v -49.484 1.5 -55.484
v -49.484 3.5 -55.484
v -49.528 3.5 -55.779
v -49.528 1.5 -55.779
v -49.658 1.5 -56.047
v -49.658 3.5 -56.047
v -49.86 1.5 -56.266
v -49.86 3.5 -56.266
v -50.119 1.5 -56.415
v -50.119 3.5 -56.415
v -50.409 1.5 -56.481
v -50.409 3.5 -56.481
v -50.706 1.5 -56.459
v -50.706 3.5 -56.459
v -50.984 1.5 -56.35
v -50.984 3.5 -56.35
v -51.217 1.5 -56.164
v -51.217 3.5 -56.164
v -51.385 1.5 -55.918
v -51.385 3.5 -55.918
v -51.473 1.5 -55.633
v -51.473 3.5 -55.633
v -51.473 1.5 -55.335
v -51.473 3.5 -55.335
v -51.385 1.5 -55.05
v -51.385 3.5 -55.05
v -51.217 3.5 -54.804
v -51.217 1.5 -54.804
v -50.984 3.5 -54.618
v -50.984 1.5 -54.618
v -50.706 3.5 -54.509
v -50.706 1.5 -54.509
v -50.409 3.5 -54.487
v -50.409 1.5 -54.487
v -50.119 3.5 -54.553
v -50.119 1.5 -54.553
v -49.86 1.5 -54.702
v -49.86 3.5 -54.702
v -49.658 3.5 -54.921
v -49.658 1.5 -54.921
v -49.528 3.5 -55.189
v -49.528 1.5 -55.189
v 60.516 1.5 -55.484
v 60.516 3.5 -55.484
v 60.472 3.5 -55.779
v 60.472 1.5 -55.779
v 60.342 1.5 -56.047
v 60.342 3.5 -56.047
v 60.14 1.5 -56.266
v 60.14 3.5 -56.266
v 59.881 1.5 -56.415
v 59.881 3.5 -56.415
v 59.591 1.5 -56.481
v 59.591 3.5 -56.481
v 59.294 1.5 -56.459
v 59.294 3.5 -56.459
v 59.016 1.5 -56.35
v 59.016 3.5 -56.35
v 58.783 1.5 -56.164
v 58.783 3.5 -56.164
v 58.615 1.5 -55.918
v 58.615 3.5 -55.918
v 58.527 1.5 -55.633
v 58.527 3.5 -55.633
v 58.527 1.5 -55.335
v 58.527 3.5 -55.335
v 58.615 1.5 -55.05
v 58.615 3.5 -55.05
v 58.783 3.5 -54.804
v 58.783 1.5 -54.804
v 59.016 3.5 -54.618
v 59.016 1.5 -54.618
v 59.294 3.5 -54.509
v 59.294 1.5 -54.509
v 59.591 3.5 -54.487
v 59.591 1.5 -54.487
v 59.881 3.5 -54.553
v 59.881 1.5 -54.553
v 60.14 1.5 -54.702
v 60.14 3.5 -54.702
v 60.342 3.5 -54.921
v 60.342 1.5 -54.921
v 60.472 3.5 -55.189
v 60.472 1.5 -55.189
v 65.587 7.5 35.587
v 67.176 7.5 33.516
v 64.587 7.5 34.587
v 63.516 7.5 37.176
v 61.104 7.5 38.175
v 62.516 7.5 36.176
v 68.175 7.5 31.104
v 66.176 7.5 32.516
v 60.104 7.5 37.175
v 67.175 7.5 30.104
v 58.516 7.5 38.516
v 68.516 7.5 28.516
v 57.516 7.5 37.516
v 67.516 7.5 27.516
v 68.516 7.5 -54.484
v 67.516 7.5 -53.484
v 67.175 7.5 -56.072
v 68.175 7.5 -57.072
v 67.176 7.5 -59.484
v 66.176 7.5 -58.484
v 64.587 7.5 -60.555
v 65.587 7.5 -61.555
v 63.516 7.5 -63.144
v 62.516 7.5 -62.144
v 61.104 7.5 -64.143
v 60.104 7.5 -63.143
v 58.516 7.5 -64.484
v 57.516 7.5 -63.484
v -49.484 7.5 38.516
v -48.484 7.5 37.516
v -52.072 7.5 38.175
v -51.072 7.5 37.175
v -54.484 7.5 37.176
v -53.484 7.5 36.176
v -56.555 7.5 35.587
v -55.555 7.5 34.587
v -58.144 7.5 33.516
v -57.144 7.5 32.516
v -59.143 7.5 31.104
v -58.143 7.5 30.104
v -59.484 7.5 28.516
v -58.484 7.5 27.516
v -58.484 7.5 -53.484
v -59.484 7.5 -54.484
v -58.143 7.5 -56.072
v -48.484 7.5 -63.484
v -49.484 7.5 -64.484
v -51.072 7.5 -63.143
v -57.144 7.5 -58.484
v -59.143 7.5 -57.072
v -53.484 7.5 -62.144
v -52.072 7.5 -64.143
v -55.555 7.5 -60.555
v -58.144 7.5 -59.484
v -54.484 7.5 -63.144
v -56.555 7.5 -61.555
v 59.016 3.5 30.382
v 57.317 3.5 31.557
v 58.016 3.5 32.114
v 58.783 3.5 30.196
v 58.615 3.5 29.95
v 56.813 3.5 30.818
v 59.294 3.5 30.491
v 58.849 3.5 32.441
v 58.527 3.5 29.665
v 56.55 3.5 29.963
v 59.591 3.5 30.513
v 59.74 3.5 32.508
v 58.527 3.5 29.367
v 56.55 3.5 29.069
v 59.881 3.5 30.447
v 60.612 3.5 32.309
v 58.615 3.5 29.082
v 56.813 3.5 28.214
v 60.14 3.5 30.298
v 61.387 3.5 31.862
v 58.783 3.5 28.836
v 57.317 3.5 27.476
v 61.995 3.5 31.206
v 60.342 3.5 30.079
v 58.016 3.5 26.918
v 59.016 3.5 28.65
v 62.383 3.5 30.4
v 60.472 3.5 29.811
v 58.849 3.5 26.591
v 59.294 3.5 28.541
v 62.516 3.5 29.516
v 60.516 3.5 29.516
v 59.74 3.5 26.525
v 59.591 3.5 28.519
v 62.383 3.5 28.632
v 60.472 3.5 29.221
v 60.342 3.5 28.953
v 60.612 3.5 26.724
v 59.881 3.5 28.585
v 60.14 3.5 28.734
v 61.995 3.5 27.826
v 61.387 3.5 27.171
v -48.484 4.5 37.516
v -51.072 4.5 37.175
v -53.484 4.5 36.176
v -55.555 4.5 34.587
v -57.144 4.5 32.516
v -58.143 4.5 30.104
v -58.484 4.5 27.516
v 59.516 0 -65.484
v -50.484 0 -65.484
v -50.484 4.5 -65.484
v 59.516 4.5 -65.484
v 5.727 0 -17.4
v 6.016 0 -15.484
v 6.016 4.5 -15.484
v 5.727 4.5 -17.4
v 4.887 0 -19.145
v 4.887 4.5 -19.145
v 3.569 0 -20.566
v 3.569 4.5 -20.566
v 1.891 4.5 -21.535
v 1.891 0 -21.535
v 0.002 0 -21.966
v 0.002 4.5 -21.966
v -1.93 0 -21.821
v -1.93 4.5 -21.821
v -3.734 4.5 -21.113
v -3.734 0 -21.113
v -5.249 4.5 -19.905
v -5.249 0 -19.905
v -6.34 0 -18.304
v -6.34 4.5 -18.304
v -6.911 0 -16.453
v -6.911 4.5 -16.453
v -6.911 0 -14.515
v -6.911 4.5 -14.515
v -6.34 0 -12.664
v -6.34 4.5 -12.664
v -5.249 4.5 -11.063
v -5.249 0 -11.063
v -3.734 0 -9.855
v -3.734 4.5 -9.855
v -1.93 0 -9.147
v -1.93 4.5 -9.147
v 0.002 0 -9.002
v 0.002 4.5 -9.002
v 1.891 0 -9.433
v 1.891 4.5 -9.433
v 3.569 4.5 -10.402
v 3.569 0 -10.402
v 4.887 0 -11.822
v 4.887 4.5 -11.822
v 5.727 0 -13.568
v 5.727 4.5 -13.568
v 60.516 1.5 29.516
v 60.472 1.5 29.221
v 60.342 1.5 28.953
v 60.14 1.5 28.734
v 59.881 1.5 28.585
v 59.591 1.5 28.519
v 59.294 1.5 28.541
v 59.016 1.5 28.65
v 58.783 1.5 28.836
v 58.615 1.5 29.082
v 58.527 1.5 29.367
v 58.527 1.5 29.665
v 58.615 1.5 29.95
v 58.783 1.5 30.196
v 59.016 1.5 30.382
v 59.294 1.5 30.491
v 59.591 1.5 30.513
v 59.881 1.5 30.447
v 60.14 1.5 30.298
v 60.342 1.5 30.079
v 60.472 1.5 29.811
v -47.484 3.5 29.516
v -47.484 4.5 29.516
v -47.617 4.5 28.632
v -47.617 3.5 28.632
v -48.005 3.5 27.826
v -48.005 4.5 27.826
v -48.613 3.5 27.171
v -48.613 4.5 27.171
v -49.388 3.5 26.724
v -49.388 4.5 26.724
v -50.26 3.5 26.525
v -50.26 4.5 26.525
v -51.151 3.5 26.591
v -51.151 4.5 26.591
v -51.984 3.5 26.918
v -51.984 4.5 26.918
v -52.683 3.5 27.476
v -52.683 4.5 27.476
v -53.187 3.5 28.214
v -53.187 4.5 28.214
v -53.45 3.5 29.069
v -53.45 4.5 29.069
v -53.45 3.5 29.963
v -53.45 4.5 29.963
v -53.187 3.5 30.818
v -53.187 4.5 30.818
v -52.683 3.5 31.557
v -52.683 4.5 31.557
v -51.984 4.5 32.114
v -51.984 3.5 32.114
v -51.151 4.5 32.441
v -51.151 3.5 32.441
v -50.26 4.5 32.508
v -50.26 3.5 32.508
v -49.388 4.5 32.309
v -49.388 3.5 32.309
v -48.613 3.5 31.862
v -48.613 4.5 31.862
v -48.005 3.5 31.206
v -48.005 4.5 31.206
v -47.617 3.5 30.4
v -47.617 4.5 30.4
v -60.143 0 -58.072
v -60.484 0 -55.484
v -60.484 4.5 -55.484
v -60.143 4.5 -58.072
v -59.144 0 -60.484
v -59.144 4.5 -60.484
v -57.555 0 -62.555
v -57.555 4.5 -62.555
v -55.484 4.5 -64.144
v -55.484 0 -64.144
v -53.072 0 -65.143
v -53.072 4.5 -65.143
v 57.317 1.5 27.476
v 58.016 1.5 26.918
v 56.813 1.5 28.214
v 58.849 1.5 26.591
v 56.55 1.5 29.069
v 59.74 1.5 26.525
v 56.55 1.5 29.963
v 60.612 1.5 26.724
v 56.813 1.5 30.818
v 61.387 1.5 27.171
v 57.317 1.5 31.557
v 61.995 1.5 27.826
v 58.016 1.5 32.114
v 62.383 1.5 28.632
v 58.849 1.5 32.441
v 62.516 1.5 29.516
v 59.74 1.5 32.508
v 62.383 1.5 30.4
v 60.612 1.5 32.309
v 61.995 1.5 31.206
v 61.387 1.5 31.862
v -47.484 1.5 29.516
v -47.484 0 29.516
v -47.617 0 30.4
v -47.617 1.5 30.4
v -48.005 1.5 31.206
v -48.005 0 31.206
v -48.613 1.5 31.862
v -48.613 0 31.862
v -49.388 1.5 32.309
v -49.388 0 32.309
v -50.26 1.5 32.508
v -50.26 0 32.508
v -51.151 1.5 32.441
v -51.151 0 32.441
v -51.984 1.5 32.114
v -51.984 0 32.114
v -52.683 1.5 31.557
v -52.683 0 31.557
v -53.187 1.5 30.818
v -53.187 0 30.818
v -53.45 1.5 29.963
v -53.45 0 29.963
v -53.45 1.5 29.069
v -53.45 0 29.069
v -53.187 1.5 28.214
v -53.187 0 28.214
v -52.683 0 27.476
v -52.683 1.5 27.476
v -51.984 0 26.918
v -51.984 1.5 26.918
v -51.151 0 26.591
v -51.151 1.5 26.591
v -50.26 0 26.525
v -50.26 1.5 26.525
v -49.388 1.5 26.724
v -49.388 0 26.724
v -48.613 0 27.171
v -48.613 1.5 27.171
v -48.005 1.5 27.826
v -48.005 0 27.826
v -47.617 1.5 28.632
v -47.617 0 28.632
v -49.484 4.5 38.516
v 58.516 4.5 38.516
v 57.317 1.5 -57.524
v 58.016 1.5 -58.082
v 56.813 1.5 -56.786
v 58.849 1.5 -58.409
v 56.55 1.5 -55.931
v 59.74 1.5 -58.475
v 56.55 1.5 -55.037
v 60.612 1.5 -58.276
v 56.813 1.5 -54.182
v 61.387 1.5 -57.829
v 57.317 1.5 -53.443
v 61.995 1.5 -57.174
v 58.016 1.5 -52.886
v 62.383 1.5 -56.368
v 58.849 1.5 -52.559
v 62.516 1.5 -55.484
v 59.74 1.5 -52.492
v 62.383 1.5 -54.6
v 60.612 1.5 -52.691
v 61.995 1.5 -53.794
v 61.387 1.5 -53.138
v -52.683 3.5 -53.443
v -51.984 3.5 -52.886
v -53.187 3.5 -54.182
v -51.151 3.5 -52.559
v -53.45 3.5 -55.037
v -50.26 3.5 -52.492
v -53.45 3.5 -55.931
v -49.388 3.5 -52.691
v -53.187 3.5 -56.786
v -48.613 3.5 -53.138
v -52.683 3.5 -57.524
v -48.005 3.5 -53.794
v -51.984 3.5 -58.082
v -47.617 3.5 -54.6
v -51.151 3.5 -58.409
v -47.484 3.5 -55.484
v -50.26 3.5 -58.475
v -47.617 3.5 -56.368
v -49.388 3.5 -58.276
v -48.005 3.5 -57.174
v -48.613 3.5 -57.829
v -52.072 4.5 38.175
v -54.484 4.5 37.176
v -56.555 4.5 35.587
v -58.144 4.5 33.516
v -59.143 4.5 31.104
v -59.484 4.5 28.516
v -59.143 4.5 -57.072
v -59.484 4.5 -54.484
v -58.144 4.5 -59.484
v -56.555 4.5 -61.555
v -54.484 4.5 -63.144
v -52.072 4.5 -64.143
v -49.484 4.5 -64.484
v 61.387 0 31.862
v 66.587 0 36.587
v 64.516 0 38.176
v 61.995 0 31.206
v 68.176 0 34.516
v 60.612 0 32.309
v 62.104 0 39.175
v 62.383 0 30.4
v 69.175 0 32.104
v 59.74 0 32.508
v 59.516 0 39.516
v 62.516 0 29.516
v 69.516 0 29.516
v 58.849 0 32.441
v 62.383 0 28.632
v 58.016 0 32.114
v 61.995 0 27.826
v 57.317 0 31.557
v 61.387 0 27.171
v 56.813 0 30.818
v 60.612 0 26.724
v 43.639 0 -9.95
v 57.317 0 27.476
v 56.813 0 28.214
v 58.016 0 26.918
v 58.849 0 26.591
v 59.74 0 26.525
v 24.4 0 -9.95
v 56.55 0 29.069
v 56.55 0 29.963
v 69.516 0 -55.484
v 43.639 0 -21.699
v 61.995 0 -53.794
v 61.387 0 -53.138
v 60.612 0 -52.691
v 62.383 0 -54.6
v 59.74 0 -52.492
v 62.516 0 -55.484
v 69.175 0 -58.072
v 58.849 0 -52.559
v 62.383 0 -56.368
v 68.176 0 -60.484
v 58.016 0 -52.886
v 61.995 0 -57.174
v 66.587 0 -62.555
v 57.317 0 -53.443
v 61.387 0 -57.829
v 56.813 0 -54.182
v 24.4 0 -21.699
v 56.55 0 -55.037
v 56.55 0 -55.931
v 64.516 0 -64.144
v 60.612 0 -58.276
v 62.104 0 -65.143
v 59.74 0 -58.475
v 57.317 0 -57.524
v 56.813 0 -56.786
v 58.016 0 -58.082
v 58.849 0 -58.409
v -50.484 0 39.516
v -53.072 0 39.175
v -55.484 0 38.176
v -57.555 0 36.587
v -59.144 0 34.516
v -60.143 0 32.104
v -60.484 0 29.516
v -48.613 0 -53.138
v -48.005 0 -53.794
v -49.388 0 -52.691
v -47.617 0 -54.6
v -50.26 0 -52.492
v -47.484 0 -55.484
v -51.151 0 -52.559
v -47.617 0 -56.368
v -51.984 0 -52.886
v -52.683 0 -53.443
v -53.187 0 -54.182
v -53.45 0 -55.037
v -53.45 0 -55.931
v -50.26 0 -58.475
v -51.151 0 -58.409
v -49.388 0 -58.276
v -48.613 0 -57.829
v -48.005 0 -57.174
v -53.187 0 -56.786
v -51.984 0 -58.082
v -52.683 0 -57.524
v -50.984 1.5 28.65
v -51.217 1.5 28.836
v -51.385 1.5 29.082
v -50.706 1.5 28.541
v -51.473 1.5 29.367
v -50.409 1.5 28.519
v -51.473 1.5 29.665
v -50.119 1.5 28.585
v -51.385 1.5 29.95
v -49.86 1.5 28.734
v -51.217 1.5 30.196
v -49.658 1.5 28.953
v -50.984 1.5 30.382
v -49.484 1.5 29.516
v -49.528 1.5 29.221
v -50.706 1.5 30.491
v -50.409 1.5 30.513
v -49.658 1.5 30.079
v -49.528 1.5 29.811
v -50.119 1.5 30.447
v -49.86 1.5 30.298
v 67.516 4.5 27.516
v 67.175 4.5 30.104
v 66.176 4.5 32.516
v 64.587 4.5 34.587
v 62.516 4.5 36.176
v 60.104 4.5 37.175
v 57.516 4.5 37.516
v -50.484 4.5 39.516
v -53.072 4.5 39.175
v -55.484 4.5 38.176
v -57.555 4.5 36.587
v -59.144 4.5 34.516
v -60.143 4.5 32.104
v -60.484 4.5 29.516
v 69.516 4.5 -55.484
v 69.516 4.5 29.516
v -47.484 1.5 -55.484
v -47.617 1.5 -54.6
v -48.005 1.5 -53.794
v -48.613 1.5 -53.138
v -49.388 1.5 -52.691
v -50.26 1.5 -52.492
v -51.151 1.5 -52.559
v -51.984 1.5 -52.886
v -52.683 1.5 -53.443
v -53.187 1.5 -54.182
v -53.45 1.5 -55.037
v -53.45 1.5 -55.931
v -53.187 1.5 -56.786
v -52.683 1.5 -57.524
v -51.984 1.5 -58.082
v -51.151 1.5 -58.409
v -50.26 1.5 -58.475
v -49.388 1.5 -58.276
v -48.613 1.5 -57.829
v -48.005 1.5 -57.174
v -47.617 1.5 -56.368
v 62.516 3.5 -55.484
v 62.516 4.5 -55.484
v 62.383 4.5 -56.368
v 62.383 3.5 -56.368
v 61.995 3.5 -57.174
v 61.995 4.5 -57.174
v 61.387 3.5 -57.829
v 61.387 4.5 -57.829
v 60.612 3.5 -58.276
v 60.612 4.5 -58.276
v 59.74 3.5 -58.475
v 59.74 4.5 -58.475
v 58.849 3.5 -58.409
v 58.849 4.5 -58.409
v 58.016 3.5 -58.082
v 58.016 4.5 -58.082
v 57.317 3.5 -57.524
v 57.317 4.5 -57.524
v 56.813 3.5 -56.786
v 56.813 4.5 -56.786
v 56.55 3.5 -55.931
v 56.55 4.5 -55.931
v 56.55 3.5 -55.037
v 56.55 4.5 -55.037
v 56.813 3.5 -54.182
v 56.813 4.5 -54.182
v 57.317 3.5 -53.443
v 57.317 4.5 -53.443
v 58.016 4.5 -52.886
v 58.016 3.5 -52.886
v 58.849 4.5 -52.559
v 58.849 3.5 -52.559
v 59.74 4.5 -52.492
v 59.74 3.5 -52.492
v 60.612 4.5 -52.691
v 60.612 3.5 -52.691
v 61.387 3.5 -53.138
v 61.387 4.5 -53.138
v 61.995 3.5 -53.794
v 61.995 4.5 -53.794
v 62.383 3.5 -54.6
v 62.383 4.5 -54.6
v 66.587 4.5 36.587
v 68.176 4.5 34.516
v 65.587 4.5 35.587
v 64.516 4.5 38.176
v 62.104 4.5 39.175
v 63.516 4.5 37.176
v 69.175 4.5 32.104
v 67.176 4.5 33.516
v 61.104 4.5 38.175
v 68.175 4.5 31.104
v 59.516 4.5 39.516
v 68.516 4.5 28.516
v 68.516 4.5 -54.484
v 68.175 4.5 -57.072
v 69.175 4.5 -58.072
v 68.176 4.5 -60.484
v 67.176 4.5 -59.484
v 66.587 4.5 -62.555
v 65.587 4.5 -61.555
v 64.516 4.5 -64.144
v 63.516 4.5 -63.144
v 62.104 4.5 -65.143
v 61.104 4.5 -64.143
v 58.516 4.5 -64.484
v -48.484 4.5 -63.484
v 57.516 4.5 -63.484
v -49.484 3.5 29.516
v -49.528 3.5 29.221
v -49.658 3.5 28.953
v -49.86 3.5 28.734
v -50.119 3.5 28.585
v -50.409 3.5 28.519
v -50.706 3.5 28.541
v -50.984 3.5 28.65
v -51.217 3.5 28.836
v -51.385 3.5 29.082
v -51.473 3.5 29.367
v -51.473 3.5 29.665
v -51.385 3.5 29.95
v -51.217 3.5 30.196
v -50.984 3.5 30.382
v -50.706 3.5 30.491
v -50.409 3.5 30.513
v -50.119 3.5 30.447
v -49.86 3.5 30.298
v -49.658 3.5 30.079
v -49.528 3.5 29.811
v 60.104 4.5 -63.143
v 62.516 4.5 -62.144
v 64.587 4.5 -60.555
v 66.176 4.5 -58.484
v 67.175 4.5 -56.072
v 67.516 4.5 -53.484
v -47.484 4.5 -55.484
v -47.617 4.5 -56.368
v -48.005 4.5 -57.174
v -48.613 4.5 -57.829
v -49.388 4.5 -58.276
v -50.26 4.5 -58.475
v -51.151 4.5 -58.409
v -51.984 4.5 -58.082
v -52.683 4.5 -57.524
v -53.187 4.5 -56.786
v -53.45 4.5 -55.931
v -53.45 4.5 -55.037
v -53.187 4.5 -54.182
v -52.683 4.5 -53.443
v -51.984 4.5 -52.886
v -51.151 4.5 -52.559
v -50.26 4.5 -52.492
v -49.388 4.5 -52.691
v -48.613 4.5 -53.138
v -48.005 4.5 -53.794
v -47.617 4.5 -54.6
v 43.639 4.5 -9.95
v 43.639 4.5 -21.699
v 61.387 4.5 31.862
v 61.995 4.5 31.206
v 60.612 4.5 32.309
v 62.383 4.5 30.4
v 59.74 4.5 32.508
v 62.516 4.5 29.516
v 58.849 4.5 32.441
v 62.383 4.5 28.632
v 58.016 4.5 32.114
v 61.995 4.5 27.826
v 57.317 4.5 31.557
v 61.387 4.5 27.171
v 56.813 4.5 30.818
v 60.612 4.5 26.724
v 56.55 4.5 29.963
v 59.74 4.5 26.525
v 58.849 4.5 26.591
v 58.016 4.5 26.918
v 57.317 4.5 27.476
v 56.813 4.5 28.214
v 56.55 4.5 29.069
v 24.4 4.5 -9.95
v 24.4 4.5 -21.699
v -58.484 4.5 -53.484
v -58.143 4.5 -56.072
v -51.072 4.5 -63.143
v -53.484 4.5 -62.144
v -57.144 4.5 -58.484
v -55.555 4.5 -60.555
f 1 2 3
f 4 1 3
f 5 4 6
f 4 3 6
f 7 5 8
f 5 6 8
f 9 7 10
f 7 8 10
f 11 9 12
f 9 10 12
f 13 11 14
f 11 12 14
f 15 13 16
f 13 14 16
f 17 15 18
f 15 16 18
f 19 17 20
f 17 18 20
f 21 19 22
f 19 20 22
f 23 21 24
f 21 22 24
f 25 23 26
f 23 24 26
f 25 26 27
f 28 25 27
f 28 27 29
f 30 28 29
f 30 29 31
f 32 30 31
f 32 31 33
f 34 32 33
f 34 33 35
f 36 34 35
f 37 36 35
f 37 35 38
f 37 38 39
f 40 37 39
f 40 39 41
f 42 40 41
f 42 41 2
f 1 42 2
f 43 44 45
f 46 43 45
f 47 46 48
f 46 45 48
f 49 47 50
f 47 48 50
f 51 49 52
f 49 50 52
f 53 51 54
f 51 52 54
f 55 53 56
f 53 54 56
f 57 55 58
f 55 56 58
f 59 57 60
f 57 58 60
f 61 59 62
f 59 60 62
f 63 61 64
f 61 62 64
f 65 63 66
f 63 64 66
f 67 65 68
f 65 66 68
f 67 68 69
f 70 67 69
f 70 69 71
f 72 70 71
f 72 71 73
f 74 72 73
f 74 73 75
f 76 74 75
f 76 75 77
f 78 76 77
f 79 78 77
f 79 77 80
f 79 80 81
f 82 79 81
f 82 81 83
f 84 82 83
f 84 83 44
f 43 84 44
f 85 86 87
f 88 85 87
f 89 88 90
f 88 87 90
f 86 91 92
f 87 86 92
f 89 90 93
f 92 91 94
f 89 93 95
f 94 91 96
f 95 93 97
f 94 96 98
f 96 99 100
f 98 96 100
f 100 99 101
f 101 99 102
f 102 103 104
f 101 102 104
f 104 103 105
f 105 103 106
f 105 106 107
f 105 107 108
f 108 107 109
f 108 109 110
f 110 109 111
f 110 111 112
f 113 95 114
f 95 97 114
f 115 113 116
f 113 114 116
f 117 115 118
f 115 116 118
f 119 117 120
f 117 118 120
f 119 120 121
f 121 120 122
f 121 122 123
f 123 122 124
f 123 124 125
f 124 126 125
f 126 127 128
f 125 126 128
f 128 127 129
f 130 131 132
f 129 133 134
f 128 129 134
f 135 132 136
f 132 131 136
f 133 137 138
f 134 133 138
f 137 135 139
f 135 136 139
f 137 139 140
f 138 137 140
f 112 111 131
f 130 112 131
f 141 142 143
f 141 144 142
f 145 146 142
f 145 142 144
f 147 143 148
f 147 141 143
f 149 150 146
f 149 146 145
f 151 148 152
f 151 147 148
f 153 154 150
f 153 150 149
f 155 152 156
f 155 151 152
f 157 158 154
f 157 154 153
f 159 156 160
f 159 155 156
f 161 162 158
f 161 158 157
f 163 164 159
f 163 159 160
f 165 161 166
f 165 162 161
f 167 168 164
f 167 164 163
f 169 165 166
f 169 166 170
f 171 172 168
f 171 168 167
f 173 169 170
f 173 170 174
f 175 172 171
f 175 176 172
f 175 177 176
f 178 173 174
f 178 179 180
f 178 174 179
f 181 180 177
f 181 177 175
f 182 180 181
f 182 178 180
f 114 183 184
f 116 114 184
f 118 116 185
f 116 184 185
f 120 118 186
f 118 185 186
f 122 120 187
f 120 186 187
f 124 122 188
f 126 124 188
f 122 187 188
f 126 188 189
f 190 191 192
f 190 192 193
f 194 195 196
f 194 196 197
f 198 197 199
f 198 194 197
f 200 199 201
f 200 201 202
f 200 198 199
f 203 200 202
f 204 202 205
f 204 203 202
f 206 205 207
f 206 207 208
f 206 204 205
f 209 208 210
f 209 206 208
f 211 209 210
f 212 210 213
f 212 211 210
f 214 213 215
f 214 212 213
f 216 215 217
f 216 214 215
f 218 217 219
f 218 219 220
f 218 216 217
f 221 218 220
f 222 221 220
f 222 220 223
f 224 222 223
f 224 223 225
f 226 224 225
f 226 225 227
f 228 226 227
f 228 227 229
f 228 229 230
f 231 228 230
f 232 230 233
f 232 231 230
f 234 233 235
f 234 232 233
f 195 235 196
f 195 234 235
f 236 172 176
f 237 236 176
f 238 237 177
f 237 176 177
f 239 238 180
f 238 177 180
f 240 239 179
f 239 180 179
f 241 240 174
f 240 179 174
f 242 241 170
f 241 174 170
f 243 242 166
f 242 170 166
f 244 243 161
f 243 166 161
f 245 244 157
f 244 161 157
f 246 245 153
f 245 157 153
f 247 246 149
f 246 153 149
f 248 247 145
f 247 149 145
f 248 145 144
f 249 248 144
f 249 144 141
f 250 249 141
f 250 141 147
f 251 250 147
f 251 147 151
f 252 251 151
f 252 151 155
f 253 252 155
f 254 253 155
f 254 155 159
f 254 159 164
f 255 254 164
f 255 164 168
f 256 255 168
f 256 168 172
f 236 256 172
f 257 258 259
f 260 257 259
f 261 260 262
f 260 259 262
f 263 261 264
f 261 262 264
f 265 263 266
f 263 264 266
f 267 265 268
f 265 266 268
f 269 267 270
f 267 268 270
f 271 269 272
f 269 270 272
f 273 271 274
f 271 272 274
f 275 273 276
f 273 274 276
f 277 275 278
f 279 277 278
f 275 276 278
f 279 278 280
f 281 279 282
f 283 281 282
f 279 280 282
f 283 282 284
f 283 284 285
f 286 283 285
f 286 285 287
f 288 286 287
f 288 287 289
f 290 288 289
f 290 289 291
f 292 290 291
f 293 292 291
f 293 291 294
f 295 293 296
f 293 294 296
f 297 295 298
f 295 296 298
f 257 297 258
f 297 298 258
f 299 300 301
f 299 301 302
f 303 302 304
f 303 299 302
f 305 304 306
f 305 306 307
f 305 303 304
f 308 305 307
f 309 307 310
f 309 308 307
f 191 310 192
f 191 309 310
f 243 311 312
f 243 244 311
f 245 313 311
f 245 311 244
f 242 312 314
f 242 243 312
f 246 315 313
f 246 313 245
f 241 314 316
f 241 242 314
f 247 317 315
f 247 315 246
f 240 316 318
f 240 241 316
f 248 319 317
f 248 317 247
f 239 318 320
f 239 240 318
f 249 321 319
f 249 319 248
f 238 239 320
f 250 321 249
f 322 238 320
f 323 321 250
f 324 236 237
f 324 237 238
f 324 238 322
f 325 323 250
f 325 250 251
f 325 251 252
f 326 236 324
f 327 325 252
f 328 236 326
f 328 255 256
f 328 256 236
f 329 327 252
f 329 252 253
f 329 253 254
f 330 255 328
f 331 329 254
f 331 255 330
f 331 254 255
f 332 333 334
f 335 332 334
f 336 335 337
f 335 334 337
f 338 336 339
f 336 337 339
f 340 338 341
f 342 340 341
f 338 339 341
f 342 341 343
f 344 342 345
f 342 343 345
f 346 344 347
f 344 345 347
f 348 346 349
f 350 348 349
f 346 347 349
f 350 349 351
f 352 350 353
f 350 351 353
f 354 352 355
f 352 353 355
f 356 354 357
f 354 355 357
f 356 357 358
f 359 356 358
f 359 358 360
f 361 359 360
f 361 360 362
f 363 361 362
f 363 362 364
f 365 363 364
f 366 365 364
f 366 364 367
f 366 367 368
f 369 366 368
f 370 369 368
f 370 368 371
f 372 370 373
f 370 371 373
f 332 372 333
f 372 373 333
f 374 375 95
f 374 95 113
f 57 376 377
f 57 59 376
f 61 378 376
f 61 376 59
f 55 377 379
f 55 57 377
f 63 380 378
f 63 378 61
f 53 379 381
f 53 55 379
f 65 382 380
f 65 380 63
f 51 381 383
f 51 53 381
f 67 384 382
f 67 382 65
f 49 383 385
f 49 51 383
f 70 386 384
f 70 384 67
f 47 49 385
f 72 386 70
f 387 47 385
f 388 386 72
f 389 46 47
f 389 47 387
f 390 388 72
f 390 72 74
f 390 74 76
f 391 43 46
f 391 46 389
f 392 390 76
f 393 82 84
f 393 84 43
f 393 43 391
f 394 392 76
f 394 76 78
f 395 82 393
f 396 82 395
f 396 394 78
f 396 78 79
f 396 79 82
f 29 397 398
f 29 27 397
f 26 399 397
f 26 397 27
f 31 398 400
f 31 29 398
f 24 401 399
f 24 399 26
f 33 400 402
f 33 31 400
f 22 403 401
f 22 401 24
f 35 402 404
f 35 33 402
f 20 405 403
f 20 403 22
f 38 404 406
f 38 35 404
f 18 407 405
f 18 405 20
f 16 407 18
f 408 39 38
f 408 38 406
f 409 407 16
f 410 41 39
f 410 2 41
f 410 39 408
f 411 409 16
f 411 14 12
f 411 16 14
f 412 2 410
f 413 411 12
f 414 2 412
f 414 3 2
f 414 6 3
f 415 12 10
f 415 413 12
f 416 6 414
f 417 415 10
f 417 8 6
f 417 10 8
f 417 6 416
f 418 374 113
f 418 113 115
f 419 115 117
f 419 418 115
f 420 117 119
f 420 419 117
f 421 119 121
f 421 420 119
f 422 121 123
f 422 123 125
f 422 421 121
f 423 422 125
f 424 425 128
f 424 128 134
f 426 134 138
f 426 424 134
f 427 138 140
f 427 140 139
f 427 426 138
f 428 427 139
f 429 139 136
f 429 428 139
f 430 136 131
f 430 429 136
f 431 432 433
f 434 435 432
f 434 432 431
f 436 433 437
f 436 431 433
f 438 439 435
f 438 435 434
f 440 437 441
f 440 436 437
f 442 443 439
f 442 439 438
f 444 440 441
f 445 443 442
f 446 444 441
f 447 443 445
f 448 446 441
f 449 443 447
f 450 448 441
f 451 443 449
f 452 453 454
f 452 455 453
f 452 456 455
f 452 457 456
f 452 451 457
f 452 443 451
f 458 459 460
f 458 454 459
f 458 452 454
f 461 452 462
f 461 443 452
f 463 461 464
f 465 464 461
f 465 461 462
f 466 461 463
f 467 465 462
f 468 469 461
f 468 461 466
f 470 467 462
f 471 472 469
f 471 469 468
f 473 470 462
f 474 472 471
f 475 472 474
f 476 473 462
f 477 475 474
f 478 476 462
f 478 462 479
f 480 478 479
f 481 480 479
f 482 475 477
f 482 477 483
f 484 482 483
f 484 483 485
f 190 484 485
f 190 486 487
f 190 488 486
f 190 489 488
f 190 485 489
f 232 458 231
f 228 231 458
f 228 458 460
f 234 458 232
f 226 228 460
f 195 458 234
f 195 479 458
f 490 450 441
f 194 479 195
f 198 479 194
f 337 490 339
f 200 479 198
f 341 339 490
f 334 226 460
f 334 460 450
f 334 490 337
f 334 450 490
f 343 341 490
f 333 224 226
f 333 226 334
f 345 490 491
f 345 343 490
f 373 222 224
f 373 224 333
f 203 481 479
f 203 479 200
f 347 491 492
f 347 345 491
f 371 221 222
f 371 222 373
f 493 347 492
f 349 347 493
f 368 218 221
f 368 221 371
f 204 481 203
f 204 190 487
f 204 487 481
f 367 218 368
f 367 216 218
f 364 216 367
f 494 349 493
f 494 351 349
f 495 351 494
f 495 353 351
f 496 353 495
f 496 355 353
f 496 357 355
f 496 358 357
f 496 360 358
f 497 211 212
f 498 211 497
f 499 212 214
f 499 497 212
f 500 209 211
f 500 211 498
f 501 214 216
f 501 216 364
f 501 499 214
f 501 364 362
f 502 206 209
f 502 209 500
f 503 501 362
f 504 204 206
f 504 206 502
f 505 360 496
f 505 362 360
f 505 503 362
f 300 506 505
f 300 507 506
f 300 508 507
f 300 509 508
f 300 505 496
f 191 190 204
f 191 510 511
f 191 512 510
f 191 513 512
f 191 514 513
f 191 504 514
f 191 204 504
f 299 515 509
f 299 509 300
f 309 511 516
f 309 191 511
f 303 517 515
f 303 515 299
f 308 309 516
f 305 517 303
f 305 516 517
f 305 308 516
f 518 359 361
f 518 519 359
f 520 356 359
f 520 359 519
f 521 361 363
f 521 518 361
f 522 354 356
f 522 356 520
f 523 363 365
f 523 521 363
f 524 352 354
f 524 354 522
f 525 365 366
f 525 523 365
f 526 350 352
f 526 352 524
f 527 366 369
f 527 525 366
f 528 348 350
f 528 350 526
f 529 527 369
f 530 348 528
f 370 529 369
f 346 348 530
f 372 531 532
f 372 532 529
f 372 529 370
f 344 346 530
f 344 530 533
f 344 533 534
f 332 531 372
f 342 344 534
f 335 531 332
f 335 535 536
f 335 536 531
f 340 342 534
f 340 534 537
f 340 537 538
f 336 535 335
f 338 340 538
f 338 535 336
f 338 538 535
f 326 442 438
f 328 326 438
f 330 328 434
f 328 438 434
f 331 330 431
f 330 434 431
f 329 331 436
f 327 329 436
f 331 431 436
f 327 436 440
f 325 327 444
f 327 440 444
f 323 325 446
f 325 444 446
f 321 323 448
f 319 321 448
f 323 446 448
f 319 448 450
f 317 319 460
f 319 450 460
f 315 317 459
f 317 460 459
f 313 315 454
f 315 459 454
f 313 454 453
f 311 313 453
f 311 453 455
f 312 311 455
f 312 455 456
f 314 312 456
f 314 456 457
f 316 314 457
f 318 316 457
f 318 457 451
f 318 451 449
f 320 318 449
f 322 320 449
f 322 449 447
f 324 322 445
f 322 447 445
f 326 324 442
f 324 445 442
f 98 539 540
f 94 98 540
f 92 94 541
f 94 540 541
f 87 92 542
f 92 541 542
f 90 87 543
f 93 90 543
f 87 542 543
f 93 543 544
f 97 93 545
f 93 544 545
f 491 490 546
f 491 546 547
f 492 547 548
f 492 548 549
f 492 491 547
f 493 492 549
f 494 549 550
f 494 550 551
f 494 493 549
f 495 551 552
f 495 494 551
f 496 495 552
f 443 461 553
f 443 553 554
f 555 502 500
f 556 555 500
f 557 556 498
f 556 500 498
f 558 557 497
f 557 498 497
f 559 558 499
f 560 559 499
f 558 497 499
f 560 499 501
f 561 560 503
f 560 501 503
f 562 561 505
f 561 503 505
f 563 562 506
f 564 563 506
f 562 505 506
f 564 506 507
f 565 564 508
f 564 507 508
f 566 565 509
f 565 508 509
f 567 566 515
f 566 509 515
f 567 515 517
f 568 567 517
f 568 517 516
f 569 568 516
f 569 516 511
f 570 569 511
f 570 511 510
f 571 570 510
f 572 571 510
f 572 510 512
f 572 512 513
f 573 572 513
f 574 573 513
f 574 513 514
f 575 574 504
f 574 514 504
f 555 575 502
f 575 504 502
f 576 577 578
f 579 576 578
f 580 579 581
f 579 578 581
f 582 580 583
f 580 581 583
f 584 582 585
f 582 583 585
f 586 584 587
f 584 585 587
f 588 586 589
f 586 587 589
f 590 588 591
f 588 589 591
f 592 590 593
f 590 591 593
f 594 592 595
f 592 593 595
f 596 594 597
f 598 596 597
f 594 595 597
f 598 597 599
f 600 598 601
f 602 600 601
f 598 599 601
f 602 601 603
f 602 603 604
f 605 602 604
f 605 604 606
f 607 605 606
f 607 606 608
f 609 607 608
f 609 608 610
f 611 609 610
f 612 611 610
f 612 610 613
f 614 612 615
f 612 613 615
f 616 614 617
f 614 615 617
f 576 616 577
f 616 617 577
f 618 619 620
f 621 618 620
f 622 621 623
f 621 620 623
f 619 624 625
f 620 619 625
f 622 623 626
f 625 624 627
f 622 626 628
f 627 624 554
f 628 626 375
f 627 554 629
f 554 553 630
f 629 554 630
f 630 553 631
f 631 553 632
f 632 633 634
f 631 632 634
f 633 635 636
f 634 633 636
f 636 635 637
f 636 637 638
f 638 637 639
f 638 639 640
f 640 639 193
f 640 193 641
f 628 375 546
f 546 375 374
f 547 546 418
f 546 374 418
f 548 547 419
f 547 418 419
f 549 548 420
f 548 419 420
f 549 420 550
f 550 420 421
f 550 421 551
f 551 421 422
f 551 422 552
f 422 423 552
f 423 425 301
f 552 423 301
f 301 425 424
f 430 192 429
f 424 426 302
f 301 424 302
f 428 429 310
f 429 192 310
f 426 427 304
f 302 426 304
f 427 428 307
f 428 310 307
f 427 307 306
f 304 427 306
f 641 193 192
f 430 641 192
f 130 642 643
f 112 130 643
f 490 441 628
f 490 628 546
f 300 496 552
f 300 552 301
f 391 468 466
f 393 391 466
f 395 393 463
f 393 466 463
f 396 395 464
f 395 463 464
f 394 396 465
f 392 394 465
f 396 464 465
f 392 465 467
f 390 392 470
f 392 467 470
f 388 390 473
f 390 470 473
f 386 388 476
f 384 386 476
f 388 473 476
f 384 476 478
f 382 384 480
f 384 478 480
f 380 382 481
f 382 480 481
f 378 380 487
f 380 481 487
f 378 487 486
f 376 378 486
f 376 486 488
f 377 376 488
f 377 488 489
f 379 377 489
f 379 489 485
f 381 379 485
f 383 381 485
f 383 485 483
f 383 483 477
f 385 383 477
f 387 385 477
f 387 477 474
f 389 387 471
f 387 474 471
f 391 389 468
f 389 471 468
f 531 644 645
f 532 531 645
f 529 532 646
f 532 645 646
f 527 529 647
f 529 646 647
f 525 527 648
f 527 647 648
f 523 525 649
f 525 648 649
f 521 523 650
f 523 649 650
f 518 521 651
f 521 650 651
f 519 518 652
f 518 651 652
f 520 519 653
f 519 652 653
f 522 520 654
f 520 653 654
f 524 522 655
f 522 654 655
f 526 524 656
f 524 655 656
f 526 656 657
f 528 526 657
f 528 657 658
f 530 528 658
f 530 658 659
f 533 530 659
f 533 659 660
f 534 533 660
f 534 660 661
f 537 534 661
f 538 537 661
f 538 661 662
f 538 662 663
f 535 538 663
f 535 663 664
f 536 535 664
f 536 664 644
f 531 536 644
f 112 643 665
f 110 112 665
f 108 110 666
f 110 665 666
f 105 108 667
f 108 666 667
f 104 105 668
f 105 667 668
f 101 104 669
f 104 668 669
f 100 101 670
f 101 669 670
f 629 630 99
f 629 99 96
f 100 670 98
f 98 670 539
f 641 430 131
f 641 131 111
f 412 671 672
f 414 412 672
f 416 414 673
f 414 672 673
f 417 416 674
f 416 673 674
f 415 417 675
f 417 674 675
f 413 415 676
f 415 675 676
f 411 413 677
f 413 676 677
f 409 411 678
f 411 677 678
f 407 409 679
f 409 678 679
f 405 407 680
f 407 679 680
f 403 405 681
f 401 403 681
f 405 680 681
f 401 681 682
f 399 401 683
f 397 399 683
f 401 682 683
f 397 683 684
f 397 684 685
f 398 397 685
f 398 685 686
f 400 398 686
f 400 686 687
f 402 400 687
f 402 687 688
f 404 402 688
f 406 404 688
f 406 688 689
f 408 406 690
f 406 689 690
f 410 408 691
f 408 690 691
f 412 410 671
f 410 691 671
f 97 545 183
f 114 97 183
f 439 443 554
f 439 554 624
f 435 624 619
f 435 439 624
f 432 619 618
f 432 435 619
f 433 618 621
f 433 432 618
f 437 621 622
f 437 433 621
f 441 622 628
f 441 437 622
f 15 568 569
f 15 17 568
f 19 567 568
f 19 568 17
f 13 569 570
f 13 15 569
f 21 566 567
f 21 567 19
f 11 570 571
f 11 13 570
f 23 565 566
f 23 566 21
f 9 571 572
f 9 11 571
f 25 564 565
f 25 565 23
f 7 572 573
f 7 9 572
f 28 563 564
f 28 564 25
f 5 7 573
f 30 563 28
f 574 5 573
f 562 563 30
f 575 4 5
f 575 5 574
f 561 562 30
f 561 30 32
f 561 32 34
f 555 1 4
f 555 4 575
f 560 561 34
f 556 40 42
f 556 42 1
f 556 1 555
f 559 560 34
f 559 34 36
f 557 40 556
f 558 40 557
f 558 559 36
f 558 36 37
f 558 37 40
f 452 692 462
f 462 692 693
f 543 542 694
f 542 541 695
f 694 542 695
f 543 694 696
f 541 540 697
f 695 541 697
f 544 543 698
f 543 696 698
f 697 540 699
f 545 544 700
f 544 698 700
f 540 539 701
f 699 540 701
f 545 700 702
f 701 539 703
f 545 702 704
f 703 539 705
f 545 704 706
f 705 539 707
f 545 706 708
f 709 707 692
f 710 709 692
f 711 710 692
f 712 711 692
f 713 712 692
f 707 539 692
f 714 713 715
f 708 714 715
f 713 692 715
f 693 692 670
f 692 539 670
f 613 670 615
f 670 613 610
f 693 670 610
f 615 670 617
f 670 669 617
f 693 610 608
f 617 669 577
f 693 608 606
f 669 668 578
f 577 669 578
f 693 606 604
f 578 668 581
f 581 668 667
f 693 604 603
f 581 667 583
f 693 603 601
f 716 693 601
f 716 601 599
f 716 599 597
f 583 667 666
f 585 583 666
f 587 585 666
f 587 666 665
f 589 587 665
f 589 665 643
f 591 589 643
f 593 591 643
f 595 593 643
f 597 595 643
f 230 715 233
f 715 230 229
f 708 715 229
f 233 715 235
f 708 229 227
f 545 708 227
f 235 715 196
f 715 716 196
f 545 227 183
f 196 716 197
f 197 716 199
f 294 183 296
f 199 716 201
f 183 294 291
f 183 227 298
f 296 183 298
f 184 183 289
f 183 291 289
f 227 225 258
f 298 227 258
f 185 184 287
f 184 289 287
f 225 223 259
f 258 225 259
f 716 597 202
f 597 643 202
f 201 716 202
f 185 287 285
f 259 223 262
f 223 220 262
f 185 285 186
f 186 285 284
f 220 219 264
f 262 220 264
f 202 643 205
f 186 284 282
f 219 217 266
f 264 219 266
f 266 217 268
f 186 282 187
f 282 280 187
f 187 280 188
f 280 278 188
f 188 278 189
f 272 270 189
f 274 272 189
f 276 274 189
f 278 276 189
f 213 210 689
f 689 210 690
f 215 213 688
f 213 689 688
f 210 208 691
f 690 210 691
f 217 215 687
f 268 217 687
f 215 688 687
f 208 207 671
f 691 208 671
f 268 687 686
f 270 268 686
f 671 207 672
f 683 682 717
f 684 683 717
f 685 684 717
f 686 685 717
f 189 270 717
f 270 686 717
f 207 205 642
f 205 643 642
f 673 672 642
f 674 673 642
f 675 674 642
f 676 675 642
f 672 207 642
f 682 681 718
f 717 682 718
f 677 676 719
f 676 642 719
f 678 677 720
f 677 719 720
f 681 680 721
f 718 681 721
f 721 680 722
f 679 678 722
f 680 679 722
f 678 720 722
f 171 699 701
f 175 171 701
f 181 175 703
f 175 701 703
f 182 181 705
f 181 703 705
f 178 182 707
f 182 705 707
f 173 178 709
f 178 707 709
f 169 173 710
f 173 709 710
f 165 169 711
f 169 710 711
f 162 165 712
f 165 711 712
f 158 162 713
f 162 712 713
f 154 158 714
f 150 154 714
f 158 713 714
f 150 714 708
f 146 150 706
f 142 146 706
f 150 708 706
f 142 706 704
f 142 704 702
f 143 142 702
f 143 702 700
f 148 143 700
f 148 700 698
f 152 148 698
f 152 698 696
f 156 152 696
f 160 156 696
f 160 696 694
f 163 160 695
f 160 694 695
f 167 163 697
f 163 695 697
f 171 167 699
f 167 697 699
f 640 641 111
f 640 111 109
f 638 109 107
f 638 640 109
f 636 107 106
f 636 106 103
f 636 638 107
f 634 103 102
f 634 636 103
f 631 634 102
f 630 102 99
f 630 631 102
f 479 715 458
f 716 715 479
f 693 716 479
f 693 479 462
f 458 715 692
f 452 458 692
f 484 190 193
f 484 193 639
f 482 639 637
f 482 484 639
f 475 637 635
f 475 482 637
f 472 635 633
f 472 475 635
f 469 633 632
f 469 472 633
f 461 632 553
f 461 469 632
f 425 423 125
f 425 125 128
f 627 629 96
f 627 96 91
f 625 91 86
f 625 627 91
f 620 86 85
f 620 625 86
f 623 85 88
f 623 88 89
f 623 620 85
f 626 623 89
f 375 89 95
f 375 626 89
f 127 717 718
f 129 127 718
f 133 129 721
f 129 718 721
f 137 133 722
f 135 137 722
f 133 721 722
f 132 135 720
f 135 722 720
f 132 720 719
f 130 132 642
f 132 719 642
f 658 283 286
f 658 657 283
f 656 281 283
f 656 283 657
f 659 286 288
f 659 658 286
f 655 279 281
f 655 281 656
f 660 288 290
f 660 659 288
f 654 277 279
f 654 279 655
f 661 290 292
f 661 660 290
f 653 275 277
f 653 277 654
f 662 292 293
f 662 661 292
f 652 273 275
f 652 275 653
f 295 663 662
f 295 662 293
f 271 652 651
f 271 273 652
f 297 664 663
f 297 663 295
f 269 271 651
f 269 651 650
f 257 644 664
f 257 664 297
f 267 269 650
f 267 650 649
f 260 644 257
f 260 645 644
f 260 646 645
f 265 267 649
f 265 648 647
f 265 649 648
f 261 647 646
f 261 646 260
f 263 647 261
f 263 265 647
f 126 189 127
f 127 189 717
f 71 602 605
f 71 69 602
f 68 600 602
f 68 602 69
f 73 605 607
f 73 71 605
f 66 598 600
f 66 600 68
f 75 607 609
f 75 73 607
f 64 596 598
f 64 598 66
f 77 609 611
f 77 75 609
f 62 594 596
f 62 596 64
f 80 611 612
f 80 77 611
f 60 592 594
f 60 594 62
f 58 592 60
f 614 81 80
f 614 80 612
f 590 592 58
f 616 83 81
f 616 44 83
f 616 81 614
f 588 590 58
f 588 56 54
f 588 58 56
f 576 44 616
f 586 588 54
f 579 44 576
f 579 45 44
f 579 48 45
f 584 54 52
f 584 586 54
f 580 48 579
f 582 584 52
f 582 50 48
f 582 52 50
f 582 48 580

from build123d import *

# Parameters (mm, degrees)
SKETCH_1_R          = 6.5
EXTRUDE_1_DEPTH     = 4.5
EXTRUDE_2_DEPTH     = 3
SKETCH_3_R          = 1
CUT_EXTRUDE_1_DEPTH = 10
SKETCH_4_R          = 3
CUT_EXTRUDE_2_DEPTH = 1
SKETCH_5_R          = 3
CUT_EXTRUDE_3_DEPTH = 1.5
SKETCH_6_W          = 19.238645782
SKETCH_6_H          = 11.749776954
CUT_EXTRUDE_6_DEPTH = 10


with BuildPart() as part:
    # 草图1 → 凸台-拉伸1 (new body)
    with BuildSketch(Plane(origin=(0, 0, 0), x_dir=(1, 0, 0), z_dir=(0, 1, 0))):
        with BuildLine():
            Line((-50.483870968, 65.483870968), (59.516129032, 65.483870968))
            ThreePointArc((59.516129032, 65.483870968), (66.587196844, 62.55493878), (69.516129032, 55.483870968))
            Line((69.516129032, 55.483870968), (69.516129032, -29.516129032))
            ThreePointArc((69.516129032, -29.516129032), (66.587196844, -36.587196844), (59.516129032, -39.516129032))
            Line((59.516129032, -39.516129032), (-50.483870968, -39.516129032))
            ThreePointArc((-50.483870968, -39.516129032), (-57.55493878, -36.587196844), (-60.483870968, -29.516129032))
            Line((-60.483870968, -29.516129032), (-60.483870968, 55.483870968))
            ThreePointArc((-60.483870968, 55.483870968), (-57.55493878, 62.55493878), (-50.483870968, 65.483870968))
        make_face()
        with Locations((-0.483870968, 15.483870968)):
            Circle(SKETCH_1_R, mode=Mode.SUBTRACT)
    extrude(amount=EXTRUDE_1_DEPTH)

    # 草图2 → 凸台-拉伸2 (add)
    with BuildSketch(Plane(origin=(0, 4.5, 0), x_dir=(1, 0, 0), z_dir=(0, 1, 0))):
        with BuildLine():
            Line((-49.483870968, 64.483870968), (58.516129032, 64.483870968))
            ThreePointArc((58.516129032, 64.483870968), (65.587196844, 61.55493878), (68.516129032, 54.483870968))
            Line((68.516129032, 54.483870968), (68.516129032, -28.516129032))
            ThreePointArc((68.516129032, -28.516129032), (65.587196844, -35.587196844), (58.516129032, -38.516129032))
            Line((58.516129032, -38.516129032), (-49.483870968, -38.516129032))
            ThreePointArc((-49.483870968, -38.516129032), (-56.55493878, -35.587196844), (-59.483870968, -28.516129032))
            Line((-59.483870968, -28.516129032), (-59.483870968, 54.483870968))
            ThreePointArc((-59.483870968, 54.483870968), (-56.55493878, 61.55493878), (-49.483870968, 64.483870968))
        make_face()
        with BuildLine():
            Line((-48.483870968, 63.483870968), (57.516129032, 63.483870968))
            ThreePointArc((57.516129032, 63.483870968), (64.587196844, 60.55493878), (67.516129032, 53.483870968))
            Line((67.516129032, 53.483870968), (67.516129032, -27.516129032))
            ThreePointArc((67.516129032, -27.516129032), (64.587196844, -34.587196844), (57.516129032, -37.516129032))
            Line((57.516129032, -37.516129032), (-48.483870968, -37.516129032))
            ThreePointArc((-48.483870968, -37.516129032), (-55.55493878, -34.587196844), (-58.483870968, -27.516129032))
            Line((-58.483870968, -27.516129032), (-58.483870968, 53.483870968))
            ThreePointArc((-58.483870968, 53.483870968), (-55.55493878, 60.55493878), (-48.483870968, 63.483870968))
        make_face(mode=Mode.SUBTRACT)
    extrude(amount=EXTRUDE_2_DEPTH)

    # 草图3 → 切除-拉伸1 (cut)
    with BuildSketch(Plane(origin=(0, 4.5, 0), x_dir=(1, 0, 0), z_dir=(0, 1, 0))):
        with Locations((-50.483870968, 55.483870968)):
            Circle(SKETCH_3_R)
        with Locations((-50.483870968, -29.516129032)):
            Circle(SKETCH_3_R)
        with Locations((59.516129032, -29.516129032)):
            Circle(SKETCH_3_R)
        with Locations((59.516129032, 55.483870968)):
            Circle(SKETCH_3_R)
    extrude(amount=-CUT_EXTRUDE_1_DEPTH, mode=Mode.SUBTRACT)

    # 草图4 → 切除-拉伸2 (cut)
    with BuildSketch(Plane(origin=(0, 4.5, 0), x_dir=(1, 0, 0), z_dir=(0, 1, 0))):
        with Locations((-50.483870968, 55.483870968)):
            Circle(SKETCH_4_R)
        with Locations((59.516129032, 55.483870968)):
            Circle(SKETCH_4_R)
        with Locations((59.516129032, -29.516129032)):
            Circle(SKETCH_4_R)
        with Locations((-50.483870968, -29.516129032)):
            Circle(SKETCH_4_R)
    extrude(amount=-CUT_EXTRUDE_2_DEPTH, mode=Mode.SUBTRACT)

    # 草图5 → 切除-拉伸3 (cut)
    with BuildSketch(Plane.XZ):
        with Locations((-50.483870968, 29.516129032)):
            Circle(SKETCH_5_R)
        with Locations((59.516129032, 29.516129032)):
            Circle(SKETCH_5_R)
        with Locations((59.516129032, -55.483870968)):
            Circle(SKETCH_5_R)
        with Locations((-50.483870968, -55.483870968)):
            Circle(SKETCH_5_R)
    extrude(amount=-CUT_EXTRUDE_3_DEPTH, mode=Mode.SUBTRACT)

    # 草图6 → 切除-拉伸6 (cut)
    with BuildSketch(Plane(origin=(0, 4.5, 0), x_dir=(1, 0, 0), z_dir=(0, 1, 0))):
        with Locations((34.019689846, 15.824476385)):
            Rectangle(SKETCH_6_W, SKETCH_6_H)
    extrude(amount=-CUT_EXTRUDE_6_DEPTH, mode=Mode.SUBTRACT)


solid = part.part
